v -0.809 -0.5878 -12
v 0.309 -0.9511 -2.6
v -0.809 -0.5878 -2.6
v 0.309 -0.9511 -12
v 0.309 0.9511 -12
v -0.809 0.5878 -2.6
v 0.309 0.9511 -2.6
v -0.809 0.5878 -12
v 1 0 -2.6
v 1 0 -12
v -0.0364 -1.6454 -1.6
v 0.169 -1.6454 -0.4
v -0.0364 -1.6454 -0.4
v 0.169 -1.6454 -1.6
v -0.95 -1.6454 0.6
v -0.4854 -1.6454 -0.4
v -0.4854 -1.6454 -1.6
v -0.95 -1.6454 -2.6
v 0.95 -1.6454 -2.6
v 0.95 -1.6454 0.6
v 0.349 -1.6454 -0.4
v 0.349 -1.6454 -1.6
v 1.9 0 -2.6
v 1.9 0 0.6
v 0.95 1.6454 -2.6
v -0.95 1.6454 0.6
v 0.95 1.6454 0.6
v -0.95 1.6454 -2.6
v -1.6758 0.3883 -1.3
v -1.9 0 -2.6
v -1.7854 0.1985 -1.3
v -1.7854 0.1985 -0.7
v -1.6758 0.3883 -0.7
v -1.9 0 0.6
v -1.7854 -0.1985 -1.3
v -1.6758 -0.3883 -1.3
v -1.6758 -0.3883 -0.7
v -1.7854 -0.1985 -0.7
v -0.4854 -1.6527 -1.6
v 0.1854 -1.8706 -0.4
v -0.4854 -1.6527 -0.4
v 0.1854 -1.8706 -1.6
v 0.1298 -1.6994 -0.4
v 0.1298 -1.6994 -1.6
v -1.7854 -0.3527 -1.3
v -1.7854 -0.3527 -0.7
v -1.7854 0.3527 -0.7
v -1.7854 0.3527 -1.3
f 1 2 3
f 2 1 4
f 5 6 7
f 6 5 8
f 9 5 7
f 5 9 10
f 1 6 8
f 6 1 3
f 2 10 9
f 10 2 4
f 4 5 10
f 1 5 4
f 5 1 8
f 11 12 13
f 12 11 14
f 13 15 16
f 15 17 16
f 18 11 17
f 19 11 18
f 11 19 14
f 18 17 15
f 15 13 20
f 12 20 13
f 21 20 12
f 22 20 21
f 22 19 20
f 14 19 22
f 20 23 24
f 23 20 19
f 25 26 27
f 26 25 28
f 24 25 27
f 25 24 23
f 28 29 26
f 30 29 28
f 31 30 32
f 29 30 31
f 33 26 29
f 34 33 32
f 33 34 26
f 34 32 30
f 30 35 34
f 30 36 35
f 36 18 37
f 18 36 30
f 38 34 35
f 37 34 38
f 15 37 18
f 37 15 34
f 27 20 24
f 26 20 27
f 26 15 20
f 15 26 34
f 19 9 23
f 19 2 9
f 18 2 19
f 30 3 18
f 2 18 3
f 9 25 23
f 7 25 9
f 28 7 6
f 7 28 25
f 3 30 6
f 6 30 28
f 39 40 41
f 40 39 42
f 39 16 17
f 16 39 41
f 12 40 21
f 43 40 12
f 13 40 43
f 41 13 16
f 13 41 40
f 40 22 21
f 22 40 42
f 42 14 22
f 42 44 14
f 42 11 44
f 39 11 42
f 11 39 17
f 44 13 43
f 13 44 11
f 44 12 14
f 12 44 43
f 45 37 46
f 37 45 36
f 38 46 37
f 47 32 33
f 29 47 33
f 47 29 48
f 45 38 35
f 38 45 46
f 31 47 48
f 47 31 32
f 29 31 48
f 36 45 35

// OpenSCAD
// Parameters
shaft_diameter_mm = 2.0; //[1.0:4.0:0.1]
overall_length_mm = 10.0; //[5.0:20.0:0.5]
head_diameter_mm = 3.8; //[2.0:7.6:0.1]
head_height_mm = 2.0; //[1.0:4.0:0.1]
thread_pitch_mm = 0.4; //[0.2:0.8:0.05]
thread_length_mm = 10.0; //[2.0:20.0:0.5]
socket_across_flats_mm = 1.5; //[0.8:3.0:0.05]
socket_depth_mm = 1.0; //[0.5:2.0:0.05]
overlap_mm = 1.2; //[0.5:2.0:0.1]  // increased to guarantee fusion
thread_radial_add_mm = 0.12; //[0.05:0.3:0.01]
thread_start_offset_mm = 0.0; //[0.0:3.0:0.1]
placeholder_tab_thickness_mm = 0.6; //[0.4:1.5:0.1]
placeholder_tab_width_mm = 1.2; //[0.8:3.0:0.1]
placeholder_tab_height_mm = 1.2; //[0.8:3.0:0.1]

// Derived helpers
shaft_r = shaft_diameter_mm/2;
head_r  = head_diameter_mm/2;

// Place screw so head top is at z=0 and shaft extends downward (simple, stable reference)
z_head_center = -head_height_mm/2;
z_shaft_center = -(head_height_mm + overall_length_mm/2);

// Pin Socket - Custom detailed geometry
module pin_socket() {
  color("Silver")
    cube([placeholder_tab_thickness_mm, placeholder_tab_width_mm, placeholder_tab_height_mm], center=true);
}

// Screw (shaft + head) - single connected solid
module screw() {
  color("DimGray")
    union() {
      // Shaft
      translate([0,0,z_shaft_center])
        cylinder(r=shaft_r, h=overall_length_mm, center=true);

      // Head (overlap into shaft by overlap_mm)
      translate([0,0,z_head_center])
        cylinder(r=head_r, h=head_height_mm + overlap_mm, center=true);
    }
}

// PCB Spacer - Custom detailed geometry
module pcb_spacer() {
  color("Black")
    difference() {
      cylinder(r=placeholder_tab_width_mm/2, h=placeholder_tab_height_mm, center=true);
      // keep inner cut valid (avoid negative radius)
      inner_r = max(0.01, placeholder_tab_width_mm/2 - 0.18);
      translate([0, 0, -placeholder_tab_height_mm/2])
        cylinder(r=inner_r, h=placeholder_tab_height_mm + overlap_mm, center=true);
    }
}

// Buzzer - Custom detailed geometry
module buzzer() {
  color("Copper")
    cylinder(r=placeholder_tab_height_mm/2, h=placeholder_tab_thickness_mm, center=true);
}

// Assembly (all parts physically intersect the head with 1-2mm overlap)
module assembly() {
  union() {
    // Main screw
    screw();

    // Side protrusions: attach to head side with guaranteed overlap
    // X+ (light-gray)
    translate([ head_r + placeholder_tab_thickness_mm/2 - overlap_mm,
                0,
                z_head_center ])
      pin_socket();

    // X- (blue) - create missing symmetric part and attach
    color("SteelBlue")
      translate([ -(head_r + placeholder_tab_thickness_mm/2 - overlap_mm),
                  0,
                  z_head_center ])
        cube([placeholder_tab_thickness_mm, placeholder_tab_width_mm, placeholder_tab_height_mm], center=true);

    // Y- (black small protrusion) - attach to head side with overlap
    translate([ 0,
                -(head_r + placeholder_tab_height_mm/2 - overlap_mm),
                z_head_center ])
      pcb_spacer();

    // Y+ (light-gray side protrusion) - attach to head side with overlap
    color("Gainsboro")
      translate([ 0,
                  (head_r + placeholder_tab_height_mm/2 - overlap_mm),
                  z_head_center ])
        cube([placeholder_tab_height_mm, placeholder_tab_thickness_mm, placeholder_tab_width_mm], center=true);

    // Additional small protrusion (copper) - attach to head side with overlap
    translate([ -(head_r + placeholder_tab_height_mm/2 - overlap_mm),
                0,
                z_head_center ])
      buzzer();
  }
}

assembly();
